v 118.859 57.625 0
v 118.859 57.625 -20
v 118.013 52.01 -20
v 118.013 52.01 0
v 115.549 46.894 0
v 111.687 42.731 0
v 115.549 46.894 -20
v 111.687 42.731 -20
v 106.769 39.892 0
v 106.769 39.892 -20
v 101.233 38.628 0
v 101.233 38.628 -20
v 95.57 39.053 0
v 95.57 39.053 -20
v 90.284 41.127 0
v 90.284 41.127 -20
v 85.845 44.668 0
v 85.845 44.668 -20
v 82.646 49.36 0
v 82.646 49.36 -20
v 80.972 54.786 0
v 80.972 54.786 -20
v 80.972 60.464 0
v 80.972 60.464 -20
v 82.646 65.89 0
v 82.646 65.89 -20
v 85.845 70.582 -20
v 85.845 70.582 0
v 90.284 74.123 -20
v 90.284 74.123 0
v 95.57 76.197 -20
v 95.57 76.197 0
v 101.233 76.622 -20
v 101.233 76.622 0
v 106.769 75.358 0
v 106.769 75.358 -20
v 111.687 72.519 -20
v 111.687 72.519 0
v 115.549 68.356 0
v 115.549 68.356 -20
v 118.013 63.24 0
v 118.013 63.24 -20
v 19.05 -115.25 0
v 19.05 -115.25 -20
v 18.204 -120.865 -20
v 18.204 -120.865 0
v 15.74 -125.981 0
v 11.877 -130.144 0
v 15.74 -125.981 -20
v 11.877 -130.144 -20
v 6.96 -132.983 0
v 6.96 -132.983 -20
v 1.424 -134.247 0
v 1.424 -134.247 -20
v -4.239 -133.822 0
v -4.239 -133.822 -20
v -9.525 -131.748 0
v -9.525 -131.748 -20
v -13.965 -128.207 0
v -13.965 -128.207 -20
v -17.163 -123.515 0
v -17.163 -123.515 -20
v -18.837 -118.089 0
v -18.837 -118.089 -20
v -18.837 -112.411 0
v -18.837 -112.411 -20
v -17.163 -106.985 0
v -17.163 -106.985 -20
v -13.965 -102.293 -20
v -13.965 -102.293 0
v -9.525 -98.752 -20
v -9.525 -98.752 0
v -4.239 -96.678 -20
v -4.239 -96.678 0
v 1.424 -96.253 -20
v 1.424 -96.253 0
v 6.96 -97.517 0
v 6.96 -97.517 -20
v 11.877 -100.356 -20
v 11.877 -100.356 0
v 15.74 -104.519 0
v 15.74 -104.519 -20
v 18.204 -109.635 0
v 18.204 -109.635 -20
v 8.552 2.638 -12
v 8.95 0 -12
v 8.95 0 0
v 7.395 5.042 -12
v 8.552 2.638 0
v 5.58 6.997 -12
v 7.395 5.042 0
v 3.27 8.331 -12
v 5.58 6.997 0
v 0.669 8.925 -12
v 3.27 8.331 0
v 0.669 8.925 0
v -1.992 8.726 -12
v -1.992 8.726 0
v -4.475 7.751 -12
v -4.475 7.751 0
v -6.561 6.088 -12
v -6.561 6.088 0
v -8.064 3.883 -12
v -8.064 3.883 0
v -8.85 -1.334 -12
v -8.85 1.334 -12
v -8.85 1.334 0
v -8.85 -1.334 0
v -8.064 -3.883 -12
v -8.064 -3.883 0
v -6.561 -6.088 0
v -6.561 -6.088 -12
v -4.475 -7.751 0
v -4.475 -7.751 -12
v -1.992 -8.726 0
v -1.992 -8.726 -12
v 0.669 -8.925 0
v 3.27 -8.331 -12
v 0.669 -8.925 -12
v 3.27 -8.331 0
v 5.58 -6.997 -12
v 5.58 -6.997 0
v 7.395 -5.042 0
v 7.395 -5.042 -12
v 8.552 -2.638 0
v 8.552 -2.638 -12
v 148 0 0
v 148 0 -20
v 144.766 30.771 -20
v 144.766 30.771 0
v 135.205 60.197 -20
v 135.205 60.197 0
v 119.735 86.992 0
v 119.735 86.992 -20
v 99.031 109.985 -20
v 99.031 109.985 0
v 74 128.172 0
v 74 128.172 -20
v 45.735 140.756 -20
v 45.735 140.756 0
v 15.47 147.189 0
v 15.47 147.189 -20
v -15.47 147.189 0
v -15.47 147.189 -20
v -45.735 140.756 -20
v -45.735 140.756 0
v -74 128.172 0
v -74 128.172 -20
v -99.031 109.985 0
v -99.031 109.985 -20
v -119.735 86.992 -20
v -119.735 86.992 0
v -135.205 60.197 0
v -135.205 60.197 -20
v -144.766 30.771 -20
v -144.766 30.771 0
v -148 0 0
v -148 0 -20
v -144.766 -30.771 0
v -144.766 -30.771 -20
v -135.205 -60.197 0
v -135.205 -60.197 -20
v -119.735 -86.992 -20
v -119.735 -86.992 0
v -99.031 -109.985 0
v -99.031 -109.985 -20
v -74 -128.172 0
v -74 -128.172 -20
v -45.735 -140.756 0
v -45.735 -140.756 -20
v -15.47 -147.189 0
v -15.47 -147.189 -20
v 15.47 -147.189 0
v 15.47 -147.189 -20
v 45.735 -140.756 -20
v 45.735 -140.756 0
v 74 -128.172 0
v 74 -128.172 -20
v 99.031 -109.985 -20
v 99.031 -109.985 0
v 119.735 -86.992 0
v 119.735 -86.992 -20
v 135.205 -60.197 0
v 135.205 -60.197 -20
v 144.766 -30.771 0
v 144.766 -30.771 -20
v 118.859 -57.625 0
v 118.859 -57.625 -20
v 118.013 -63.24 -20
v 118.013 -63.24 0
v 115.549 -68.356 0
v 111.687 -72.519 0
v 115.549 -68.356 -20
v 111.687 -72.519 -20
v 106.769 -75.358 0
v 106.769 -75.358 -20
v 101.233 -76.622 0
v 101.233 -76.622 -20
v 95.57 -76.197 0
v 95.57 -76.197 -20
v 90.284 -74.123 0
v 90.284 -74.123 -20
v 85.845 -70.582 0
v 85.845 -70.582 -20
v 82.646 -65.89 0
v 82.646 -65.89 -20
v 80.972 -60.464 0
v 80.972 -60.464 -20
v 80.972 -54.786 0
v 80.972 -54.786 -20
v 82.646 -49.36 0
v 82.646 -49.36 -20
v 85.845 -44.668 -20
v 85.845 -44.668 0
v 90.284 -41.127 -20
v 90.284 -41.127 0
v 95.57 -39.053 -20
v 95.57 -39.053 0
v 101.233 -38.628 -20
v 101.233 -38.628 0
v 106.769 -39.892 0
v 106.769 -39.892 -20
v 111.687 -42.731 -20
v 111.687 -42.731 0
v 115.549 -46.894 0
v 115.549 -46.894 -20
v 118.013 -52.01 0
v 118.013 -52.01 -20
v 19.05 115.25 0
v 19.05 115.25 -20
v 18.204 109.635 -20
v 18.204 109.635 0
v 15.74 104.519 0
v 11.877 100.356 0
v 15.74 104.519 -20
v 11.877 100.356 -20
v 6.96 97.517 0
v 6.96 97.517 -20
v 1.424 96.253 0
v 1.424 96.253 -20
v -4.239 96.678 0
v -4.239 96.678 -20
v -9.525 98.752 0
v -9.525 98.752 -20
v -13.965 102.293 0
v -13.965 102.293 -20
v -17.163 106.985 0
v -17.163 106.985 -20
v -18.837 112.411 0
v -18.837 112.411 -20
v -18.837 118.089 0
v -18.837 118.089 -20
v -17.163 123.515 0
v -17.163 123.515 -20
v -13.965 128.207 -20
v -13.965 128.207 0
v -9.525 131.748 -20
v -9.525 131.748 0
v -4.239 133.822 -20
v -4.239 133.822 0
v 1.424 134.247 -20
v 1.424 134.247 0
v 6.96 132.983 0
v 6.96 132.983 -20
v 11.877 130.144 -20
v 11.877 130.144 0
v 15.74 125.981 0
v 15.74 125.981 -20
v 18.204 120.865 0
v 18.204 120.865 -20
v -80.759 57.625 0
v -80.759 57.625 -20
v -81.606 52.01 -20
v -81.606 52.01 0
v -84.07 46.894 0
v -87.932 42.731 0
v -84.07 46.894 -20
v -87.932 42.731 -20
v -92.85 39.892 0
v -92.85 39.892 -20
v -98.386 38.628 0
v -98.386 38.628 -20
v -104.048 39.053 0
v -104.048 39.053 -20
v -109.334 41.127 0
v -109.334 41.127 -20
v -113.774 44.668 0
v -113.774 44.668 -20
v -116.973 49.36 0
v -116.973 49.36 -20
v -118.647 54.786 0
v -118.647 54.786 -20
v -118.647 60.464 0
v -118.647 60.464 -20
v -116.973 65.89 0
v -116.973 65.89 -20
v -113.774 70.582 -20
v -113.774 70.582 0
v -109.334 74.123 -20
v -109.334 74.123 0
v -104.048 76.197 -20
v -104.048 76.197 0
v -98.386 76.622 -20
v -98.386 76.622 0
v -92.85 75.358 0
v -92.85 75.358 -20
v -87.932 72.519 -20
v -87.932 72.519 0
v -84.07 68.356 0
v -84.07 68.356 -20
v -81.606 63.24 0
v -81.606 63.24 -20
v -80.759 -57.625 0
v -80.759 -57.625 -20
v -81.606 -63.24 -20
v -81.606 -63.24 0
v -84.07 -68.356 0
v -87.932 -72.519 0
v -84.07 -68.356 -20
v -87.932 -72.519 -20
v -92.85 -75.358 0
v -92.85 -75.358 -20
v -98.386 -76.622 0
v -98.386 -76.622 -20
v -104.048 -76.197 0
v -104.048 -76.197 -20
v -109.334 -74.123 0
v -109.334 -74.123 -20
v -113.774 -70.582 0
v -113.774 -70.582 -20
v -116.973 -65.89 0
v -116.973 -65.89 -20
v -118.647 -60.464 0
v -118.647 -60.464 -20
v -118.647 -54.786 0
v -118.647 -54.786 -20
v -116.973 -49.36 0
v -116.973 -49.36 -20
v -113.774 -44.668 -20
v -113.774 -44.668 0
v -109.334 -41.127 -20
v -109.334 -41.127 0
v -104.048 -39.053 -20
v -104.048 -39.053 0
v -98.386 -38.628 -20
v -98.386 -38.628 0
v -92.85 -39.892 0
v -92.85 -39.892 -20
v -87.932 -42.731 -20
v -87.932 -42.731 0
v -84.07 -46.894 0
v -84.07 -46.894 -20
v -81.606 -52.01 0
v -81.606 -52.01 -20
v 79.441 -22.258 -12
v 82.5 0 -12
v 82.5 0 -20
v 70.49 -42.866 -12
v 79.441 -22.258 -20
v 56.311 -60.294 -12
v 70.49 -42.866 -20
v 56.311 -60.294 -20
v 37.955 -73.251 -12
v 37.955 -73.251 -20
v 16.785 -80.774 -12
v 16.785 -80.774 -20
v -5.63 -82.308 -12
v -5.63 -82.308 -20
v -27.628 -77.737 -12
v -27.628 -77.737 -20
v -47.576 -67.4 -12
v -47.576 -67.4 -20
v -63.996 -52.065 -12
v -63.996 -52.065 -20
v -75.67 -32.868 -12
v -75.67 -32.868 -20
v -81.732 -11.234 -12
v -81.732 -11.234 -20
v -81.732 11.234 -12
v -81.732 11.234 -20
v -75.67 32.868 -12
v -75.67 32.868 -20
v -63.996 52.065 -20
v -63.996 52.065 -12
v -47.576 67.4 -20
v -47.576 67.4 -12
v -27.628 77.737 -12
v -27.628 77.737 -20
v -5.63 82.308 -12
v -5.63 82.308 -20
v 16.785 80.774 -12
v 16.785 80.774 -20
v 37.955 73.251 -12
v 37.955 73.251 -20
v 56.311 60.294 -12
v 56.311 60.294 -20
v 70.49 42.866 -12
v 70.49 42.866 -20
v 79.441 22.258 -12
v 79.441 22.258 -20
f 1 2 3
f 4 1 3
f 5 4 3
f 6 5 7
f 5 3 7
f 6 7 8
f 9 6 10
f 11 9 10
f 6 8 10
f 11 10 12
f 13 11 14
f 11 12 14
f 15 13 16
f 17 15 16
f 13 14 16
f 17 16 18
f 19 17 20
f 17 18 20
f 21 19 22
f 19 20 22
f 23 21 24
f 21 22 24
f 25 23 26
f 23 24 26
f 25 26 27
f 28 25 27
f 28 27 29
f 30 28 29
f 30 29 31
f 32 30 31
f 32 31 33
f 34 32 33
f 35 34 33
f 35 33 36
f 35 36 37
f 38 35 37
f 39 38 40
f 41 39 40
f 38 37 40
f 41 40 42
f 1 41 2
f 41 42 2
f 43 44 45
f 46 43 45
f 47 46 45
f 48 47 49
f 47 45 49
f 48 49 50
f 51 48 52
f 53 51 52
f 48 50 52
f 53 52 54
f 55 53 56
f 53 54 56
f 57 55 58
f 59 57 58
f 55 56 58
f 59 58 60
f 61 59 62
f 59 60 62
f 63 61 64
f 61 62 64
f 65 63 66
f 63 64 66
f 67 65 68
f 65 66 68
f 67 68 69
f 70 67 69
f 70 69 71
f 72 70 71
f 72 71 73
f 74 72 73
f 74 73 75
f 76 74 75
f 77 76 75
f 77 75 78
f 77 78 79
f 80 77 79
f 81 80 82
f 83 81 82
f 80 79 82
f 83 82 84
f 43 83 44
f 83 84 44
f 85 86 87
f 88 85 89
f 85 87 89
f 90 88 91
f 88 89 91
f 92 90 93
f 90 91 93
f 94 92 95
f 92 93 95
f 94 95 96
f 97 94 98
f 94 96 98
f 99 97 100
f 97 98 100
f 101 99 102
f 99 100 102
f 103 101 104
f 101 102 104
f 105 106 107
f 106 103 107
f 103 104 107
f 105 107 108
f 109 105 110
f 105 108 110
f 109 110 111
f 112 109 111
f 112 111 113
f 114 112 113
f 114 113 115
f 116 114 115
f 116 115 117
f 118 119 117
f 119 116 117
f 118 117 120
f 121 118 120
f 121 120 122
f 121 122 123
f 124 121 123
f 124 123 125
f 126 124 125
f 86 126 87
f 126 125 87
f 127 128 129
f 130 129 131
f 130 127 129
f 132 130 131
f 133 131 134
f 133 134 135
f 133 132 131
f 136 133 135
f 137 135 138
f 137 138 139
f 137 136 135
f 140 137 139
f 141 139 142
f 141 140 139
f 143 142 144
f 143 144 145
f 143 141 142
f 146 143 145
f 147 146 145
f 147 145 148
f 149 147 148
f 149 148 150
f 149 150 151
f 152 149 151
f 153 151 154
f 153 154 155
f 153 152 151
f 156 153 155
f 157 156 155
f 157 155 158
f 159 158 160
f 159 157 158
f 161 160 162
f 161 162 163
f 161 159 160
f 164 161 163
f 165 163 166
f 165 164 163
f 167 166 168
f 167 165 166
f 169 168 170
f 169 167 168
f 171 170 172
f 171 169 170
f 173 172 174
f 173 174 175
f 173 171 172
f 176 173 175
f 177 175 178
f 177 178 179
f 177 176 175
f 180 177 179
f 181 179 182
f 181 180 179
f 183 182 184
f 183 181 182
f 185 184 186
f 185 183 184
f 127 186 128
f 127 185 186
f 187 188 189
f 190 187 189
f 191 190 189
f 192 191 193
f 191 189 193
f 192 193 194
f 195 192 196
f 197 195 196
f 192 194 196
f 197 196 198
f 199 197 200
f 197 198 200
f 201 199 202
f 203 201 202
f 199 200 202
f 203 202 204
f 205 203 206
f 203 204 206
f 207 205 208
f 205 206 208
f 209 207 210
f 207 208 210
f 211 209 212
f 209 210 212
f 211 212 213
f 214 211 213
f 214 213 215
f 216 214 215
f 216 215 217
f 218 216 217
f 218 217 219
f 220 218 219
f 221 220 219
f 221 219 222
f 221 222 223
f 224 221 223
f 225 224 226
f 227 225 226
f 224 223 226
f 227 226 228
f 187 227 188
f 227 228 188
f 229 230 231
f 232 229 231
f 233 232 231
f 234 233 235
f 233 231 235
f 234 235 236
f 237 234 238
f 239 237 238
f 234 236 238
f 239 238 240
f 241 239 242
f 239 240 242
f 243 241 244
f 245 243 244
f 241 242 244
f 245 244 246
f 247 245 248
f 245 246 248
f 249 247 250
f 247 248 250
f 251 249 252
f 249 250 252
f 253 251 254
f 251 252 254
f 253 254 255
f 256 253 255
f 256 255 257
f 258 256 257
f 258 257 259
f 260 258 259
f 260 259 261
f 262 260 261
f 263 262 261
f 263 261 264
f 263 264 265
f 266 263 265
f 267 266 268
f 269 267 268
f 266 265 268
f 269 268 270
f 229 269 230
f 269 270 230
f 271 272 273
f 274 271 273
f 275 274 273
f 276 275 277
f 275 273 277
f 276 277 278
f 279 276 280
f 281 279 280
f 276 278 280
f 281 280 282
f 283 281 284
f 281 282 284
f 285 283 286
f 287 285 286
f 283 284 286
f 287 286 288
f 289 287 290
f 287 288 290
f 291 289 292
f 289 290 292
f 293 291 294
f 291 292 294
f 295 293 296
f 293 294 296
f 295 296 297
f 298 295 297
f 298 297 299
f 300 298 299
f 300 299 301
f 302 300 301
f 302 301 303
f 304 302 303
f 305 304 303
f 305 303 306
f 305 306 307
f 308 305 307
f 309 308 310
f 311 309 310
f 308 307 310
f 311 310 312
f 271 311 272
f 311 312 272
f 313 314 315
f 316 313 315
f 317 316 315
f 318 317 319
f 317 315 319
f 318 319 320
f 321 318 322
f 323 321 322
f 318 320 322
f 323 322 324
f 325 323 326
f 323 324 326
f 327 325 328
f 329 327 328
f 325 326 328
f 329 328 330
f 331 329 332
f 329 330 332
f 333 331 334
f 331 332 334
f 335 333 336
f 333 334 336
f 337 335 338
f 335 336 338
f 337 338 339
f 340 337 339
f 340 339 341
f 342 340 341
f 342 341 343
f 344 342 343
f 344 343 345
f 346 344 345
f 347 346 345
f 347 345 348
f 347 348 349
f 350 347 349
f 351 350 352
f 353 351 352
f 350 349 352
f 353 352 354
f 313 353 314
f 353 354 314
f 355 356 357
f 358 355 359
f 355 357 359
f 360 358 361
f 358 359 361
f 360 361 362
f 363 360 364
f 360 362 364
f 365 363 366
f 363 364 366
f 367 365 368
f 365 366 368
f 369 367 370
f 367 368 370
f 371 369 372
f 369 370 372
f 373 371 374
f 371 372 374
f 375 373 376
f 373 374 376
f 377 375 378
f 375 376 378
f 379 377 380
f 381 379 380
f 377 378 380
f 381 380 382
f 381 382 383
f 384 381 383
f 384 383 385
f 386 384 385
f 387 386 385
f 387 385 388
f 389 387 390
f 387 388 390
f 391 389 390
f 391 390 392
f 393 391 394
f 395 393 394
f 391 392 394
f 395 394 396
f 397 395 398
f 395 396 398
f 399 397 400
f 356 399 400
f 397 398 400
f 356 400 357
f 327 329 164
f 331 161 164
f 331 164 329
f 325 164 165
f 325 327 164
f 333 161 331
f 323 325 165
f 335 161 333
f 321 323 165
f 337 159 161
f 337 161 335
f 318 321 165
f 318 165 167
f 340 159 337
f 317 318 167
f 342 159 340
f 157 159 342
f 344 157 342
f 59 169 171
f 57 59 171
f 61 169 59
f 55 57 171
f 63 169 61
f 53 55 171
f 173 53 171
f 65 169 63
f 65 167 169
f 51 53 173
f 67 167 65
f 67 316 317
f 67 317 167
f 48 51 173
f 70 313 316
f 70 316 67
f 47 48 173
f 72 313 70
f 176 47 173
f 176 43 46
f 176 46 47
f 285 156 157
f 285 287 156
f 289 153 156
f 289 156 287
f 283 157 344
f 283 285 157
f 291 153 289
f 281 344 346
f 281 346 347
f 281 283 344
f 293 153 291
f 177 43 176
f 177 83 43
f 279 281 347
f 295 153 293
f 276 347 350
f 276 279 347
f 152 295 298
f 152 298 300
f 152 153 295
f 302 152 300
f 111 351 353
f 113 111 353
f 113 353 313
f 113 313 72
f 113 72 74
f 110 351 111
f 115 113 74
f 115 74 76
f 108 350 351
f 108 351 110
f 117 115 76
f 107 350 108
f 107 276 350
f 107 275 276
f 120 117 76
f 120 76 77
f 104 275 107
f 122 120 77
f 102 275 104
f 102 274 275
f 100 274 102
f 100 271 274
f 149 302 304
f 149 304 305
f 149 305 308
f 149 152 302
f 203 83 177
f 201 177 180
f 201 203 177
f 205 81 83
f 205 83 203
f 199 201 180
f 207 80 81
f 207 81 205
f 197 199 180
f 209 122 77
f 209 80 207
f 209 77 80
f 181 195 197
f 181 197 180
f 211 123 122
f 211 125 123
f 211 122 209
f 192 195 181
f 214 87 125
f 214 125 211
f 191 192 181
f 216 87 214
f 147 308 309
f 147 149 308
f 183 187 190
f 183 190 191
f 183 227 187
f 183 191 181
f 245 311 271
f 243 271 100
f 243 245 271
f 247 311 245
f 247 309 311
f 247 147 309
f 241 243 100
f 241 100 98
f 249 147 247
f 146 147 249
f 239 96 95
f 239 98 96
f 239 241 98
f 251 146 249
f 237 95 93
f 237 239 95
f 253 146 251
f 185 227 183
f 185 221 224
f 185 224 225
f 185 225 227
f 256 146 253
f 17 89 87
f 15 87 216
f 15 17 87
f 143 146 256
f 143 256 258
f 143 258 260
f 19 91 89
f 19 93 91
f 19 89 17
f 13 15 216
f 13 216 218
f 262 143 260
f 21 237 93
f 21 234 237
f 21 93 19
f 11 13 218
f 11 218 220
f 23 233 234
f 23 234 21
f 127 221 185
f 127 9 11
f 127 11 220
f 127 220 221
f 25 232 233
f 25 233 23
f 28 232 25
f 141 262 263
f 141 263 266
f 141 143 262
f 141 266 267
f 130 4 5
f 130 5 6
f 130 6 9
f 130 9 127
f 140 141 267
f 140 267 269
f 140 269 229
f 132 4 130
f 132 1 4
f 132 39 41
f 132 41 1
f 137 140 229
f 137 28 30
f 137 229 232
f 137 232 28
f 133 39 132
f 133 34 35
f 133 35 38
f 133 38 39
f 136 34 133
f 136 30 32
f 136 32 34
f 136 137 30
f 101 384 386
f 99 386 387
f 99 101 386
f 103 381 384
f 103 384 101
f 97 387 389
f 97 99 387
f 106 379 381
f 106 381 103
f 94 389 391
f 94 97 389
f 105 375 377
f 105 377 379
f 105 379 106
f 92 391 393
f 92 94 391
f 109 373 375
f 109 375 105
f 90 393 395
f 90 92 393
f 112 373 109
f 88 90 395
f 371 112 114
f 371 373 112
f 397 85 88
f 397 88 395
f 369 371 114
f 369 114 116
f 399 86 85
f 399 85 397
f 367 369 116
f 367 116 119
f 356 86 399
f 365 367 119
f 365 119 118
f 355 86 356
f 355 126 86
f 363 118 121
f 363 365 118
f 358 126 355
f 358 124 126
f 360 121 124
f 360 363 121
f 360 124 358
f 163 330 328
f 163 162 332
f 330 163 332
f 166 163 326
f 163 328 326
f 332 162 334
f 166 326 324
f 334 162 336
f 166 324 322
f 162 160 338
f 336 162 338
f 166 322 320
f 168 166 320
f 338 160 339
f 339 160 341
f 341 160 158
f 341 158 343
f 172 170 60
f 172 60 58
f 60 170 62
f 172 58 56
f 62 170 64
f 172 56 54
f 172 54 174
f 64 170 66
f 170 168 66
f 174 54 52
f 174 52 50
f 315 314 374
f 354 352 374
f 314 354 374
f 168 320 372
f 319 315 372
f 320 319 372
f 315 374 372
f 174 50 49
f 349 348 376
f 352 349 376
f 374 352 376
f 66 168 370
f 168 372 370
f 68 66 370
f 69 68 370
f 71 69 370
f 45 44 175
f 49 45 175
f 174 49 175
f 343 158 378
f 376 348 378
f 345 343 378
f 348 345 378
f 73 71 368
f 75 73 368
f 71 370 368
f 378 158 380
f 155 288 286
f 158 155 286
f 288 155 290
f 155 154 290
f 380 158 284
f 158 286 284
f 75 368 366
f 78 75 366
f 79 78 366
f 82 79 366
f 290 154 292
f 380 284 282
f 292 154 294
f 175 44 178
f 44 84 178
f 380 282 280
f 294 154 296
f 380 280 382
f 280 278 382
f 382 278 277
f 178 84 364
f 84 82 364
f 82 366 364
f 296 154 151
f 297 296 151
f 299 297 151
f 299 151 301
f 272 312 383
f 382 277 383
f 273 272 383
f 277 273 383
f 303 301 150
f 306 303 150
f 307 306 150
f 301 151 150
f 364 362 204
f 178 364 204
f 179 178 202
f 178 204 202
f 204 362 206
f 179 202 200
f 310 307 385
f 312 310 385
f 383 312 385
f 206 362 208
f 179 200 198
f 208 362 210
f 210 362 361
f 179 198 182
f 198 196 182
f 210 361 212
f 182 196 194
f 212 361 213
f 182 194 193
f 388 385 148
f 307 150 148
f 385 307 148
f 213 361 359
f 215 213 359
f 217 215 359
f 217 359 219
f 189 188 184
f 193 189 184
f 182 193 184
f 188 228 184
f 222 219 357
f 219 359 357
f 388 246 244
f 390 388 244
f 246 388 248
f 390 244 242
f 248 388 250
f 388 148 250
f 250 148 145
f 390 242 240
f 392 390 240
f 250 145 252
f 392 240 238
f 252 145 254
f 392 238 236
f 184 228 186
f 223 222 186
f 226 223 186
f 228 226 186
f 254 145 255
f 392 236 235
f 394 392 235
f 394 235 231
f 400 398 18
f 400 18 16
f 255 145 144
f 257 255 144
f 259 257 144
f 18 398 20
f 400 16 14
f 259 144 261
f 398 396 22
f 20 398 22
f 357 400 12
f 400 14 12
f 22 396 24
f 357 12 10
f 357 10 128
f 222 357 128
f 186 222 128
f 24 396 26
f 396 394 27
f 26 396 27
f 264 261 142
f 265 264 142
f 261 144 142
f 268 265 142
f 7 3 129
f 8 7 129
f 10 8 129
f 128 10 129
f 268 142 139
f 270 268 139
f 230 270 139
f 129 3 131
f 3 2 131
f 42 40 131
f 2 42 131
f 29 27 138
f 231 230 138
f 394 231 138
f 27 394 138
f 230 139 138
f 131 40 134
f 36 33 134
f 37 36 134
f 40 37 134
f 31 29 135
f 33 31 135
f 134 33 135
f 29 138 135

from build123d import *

# Parameters (mm, degrees)
F0_R     = 148
F0_R_2   = 8.95
F1_DEPTH = 20
F2_R     = 82.5
F2_R_2   = 8.95
F3_DEPTH = 8
F2_R_3   = 19.05
F4_DEPTH = 20


with BuildPart() as f1:
    # F0 (on Top) → F1 (new body)
    with BuildSketch(Plane.XY):
        Circle(F0_R)
        Circle(F0_R_2, mode=Mode.SUBTRACT)
    extrude(amount=-F1_DEPTH)

    # F2 (on face) → F3 (cut)
    with BuildSketch(Plane(origin=(0, 0, -20), x_dir=(1, 0, 0), z_dir=(0, 0, -1))):
        Circle(F2_R)
        Circle(F2_R_2, mode=Mode.SUBTRACT)
    extrude(amount=-F3_DEPTH, mode=Mode.SUBTRACT)

    # F2 (on face) → F4 (cut, through all)
    with BuildSketch(Plane(origin=(0, 0, -20), x_dir=(1, 0, 0), z_dir=(0, 0, -1))):
        with Locations((-99.809428, 57.625)):
            Circle(F2_R_3)
        with Locations((-99.809428, -57.625)):
            Circle(F2_R_3)
        with Locations((0, -115.25)):
            Circle(F2_R_3)
        with Locations((99.809428, -57.625)):
            Circle(F2_R_3)
        with Locations((99.809428, 57.625)):
            Circle(F2_R_3)
        with Locations((0, 115.25)):
            Circle(F2_R_3)
    extrude(amount=-F4_DEPTH, mode=Mode.SUBTRACT)


with BuildPart() as f5_1:
    # F5: copy of F1
    add(f1.part)


solid = f1.part
